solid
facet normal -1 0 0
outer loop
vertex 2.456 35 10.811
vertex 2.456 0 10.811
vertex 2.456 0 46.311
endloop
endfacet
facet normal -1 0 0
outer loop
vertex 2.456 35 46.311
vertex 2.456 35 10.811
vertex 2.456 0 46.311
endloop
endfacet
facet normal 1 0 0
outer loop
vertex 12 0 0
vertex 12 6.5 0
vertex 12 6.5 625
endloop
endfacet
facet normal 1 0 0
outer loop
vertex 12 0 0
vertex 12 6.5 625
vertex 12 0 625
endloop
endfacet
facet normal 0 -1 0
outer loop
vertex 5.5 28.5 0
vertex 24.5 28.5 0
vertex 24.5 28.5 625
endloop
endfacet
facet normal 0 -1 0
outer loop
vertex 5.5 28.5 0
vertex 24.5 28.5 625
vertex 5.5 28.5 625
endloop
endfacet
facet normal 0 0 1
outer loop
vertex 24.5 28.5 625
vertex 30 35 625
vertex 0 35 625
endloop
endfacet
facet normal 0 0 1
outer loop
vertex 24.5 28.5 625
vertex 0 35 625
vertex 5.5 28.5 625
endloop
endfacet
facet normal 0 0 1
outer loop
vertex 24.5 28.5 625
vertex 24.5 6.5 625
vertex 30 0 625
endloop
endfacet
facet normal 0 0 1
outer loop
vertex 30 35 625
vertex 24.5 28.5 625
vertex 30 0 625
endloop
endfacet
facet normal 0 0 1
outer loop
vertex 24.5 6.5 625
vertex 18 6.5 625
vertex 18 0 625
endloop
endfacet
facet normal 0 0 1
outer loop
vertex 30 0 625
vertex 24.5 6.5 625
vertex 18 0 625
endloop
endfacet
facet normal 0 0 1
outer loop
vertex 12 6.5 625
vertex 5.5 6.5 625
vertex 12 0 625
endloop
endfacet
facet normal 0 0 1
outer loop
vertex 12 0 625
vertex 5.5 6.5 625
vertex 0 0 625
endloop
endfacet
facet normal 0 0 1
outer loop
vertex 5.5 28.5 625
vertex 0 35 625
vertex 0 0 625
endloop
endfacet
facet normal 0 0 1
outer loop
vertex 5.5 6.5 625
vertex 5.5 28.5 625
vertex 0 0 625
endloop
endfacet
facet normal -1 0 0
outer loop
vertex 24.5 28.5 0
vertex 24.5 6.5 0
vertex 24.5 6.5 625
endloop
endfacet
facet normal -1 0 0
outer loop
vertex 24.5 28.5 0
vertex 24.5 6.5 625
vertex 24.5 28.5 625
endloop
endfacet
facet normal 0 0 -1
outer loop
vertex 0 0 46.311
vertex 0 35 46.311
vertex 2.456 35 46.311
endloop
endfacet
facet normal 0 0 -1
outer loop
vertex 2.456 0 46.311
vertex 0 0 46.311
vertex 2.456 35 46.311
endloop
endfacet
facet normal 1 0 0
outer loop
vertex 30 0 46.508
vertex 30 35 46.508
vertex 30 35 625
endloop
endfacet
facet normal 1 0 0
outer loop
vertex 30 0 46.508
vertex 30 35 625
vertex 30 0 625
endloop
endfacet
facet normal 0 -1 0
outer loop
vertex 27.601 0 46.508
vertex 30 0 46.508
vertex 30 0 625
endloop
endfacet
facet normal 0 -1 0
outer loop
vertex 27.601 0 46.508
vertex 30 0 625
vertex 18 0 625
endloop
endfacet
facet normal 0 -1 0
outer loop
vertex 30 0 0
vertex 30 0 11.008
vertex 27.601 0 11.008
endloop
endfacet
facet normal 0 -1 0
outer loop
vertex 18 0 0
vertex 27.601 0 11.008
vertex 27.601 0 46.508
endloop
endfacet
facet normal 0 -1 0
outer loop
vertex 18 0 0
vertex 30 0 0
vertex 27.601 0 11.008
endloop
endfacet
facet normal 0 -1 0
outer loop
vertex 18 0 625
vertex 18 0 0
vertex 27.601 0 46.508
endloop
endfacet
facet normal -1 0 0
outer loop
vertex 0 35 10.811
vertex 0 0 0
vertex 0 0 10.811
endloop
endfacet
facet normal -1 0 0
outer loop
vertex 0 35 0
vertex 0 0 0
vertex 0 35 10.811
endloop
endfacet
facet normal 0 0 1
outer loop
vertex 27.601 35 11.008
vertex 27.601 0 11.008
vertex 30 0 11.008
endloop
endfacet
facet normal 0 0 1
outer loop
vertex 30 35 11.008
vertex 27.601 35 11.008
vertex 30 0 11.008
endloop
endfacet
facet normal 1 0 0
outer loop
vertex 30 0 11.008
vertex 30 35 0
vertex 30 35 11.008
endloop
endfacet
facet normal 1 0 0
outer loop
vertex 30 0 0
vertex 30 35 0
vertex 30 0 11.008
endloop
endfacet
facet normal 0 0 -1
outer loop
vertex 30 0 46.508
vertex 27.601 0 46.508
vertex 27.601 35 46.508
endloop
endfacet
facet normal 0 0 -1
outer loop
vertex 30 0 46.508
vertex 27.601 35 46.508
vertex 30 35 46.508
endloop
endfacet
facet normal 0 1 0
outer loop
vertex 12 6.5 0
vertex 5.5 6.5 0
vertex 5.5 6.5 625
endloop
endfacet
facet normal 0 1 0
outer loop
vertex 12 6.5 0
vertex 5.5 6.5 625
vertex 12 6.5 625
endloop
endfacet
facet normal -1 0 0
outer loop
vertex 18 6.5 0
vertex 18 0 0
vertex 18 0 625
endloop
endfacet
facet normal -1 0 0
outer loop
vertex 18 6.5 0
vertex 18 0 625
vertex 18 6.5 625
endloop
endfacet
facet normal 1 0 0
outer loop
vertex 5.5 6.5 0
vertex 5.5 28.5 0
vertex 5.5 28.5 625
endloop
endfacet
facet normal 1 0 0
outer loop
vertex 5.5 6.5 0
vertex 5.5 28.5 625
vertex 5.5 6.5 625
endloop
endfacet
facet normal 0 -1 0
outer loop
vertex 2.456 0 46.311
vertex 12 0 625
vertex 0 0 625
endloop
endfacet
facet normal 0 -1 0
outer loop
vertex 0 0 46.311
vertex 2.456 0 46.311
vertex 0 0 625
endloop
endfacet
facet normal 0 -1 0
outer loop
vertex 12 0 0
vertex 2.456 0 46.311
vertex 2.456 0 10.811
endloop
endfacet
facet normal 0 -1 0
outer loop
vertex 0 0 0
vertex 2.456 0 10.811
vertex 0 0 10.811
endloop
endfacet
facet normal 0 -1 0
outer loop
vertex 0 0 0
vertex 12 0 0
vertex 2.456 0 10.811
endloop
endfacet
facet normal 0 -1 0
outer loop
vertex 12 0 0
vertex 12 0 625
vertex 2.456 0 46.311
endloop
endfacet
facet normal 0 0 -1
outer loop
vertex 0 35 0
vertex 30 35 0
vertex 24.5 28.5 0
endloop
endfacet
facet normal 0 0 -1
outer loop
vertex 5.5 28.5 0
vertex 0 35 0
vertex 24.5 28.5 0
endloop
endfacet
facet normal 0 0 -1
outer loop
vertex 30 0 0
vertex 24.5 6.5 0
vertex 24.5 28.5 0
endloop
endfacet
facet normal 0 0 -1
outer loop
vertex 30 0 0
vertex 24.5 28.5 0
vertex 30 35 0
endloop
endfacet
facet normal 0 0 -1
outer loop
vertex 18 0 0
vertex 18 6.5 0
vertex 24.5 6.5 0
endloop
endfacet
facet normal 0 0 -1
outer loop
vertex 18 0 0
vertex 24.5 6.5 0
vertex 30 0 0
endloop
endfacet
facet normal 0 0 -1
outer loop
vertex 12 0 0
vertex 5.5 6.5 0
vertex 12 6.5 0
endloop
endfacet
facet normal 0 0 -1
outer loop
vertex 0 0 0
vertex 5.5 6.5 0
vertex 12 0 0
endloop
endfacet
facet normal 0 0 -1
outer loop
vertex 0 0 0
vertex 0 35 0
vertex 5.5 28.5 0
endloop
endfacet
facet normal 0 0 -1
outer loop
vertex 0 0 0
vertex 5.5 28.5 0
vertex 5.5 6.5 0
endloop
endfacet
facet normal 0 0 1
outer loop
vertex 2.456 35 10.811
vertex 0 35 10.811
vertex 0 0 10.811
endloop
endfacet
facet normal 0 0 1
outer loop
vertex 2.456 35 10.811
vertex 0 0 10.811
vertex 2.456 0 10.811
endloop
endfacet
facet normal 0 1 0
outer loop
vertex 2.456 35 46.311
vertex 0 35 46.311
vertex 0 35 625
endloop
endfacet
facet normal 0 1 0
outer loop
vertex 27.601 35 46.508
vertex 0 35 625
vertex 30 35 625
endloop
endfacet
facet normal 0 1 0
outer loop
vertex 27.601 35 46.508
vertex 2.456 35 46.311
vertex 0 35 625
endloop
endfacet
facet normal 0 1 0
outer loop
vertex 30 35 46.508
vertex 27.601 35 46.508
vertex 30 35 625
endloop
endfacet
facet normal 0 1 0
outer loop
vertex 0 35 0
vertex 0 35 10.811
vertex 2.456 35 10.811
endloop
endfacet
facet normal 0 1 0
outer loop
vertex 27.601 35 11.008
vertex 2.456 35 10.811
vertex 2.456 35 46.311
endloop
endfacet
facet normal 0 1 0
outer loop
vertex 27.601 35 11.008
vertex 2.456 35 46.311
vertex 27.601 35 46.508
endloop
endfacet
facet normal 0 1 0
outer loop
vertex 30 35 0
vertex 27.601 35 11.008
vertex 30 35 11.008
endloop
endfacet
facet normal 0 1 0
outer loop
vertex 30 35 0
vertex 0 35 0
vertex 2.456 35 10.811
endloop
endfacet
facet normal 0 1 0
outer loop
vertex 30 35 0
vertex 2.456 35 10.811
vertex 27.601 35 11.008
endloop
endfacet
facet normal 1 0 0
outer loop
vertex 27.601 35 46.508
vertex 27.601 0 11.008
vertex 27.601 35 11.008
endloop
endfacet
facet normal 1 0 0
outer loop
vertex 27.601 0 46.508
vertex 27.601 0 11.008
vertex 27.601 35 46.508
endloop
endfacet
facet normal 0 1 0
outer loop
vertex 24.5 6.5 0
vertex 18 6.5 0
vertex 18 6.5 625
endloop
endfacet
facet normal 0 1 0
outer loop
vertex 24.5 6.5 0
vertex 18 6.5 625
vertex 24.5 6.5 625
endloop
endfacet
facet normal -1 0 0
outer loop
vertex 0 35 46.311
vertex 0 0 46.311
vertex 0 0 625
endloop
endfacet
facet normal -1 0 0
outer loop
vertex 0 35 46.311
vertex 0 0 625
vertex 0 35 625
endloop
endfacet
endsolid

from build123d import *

# Parameters (mm, degrees)
PAD_DEPTH            = 625
SKETCH001_W          = 2.5
SKETCH001_H          = 35.5
POCKET_DEPTH         = 35
BODY_PLACEMENT_ANGLE = 90


with BuildPart() as part:
    # Sketch → Pad (new body)
    with BuildSketch(Plane.XY):
        Polygon((0, 0), (35, 0), (35, -30), (0, -30), (0, -18), (6.5, -18), (6.5, -24.5), (28.5, -24.5), (28.5, -5.5), (6.5, -5.5), (6.5, -12), (0, -12), align=None)
    extrude(amount=PAD_DEPTH)

    # Sketch001 → Pocket (cut)
    with BuildSketch(Plane(origin=(0, 0, 0), x_dir=(0, -1, 0), z_dir=(-1, 0, 0))):
        with Locations((28.850513, 28.757815)):
            Rectangle(SKETCH001_W, SKETCH001_H)
        with Locations((1.206441, 28.56098)):
            Rectangle(SKETCH001_W, SKETCH001_H)
    extrude(amount=-POCKET_DEPTH, mode=Mode.SUBTRACT)


with BuildPart() as part_1:
    # Body placement: moved
    add(part.part.rotate(Axis((0, 0, 0), (0, 0, 1)), BODY_PLACEMENT_ANGLE))


solid = part_1.part
